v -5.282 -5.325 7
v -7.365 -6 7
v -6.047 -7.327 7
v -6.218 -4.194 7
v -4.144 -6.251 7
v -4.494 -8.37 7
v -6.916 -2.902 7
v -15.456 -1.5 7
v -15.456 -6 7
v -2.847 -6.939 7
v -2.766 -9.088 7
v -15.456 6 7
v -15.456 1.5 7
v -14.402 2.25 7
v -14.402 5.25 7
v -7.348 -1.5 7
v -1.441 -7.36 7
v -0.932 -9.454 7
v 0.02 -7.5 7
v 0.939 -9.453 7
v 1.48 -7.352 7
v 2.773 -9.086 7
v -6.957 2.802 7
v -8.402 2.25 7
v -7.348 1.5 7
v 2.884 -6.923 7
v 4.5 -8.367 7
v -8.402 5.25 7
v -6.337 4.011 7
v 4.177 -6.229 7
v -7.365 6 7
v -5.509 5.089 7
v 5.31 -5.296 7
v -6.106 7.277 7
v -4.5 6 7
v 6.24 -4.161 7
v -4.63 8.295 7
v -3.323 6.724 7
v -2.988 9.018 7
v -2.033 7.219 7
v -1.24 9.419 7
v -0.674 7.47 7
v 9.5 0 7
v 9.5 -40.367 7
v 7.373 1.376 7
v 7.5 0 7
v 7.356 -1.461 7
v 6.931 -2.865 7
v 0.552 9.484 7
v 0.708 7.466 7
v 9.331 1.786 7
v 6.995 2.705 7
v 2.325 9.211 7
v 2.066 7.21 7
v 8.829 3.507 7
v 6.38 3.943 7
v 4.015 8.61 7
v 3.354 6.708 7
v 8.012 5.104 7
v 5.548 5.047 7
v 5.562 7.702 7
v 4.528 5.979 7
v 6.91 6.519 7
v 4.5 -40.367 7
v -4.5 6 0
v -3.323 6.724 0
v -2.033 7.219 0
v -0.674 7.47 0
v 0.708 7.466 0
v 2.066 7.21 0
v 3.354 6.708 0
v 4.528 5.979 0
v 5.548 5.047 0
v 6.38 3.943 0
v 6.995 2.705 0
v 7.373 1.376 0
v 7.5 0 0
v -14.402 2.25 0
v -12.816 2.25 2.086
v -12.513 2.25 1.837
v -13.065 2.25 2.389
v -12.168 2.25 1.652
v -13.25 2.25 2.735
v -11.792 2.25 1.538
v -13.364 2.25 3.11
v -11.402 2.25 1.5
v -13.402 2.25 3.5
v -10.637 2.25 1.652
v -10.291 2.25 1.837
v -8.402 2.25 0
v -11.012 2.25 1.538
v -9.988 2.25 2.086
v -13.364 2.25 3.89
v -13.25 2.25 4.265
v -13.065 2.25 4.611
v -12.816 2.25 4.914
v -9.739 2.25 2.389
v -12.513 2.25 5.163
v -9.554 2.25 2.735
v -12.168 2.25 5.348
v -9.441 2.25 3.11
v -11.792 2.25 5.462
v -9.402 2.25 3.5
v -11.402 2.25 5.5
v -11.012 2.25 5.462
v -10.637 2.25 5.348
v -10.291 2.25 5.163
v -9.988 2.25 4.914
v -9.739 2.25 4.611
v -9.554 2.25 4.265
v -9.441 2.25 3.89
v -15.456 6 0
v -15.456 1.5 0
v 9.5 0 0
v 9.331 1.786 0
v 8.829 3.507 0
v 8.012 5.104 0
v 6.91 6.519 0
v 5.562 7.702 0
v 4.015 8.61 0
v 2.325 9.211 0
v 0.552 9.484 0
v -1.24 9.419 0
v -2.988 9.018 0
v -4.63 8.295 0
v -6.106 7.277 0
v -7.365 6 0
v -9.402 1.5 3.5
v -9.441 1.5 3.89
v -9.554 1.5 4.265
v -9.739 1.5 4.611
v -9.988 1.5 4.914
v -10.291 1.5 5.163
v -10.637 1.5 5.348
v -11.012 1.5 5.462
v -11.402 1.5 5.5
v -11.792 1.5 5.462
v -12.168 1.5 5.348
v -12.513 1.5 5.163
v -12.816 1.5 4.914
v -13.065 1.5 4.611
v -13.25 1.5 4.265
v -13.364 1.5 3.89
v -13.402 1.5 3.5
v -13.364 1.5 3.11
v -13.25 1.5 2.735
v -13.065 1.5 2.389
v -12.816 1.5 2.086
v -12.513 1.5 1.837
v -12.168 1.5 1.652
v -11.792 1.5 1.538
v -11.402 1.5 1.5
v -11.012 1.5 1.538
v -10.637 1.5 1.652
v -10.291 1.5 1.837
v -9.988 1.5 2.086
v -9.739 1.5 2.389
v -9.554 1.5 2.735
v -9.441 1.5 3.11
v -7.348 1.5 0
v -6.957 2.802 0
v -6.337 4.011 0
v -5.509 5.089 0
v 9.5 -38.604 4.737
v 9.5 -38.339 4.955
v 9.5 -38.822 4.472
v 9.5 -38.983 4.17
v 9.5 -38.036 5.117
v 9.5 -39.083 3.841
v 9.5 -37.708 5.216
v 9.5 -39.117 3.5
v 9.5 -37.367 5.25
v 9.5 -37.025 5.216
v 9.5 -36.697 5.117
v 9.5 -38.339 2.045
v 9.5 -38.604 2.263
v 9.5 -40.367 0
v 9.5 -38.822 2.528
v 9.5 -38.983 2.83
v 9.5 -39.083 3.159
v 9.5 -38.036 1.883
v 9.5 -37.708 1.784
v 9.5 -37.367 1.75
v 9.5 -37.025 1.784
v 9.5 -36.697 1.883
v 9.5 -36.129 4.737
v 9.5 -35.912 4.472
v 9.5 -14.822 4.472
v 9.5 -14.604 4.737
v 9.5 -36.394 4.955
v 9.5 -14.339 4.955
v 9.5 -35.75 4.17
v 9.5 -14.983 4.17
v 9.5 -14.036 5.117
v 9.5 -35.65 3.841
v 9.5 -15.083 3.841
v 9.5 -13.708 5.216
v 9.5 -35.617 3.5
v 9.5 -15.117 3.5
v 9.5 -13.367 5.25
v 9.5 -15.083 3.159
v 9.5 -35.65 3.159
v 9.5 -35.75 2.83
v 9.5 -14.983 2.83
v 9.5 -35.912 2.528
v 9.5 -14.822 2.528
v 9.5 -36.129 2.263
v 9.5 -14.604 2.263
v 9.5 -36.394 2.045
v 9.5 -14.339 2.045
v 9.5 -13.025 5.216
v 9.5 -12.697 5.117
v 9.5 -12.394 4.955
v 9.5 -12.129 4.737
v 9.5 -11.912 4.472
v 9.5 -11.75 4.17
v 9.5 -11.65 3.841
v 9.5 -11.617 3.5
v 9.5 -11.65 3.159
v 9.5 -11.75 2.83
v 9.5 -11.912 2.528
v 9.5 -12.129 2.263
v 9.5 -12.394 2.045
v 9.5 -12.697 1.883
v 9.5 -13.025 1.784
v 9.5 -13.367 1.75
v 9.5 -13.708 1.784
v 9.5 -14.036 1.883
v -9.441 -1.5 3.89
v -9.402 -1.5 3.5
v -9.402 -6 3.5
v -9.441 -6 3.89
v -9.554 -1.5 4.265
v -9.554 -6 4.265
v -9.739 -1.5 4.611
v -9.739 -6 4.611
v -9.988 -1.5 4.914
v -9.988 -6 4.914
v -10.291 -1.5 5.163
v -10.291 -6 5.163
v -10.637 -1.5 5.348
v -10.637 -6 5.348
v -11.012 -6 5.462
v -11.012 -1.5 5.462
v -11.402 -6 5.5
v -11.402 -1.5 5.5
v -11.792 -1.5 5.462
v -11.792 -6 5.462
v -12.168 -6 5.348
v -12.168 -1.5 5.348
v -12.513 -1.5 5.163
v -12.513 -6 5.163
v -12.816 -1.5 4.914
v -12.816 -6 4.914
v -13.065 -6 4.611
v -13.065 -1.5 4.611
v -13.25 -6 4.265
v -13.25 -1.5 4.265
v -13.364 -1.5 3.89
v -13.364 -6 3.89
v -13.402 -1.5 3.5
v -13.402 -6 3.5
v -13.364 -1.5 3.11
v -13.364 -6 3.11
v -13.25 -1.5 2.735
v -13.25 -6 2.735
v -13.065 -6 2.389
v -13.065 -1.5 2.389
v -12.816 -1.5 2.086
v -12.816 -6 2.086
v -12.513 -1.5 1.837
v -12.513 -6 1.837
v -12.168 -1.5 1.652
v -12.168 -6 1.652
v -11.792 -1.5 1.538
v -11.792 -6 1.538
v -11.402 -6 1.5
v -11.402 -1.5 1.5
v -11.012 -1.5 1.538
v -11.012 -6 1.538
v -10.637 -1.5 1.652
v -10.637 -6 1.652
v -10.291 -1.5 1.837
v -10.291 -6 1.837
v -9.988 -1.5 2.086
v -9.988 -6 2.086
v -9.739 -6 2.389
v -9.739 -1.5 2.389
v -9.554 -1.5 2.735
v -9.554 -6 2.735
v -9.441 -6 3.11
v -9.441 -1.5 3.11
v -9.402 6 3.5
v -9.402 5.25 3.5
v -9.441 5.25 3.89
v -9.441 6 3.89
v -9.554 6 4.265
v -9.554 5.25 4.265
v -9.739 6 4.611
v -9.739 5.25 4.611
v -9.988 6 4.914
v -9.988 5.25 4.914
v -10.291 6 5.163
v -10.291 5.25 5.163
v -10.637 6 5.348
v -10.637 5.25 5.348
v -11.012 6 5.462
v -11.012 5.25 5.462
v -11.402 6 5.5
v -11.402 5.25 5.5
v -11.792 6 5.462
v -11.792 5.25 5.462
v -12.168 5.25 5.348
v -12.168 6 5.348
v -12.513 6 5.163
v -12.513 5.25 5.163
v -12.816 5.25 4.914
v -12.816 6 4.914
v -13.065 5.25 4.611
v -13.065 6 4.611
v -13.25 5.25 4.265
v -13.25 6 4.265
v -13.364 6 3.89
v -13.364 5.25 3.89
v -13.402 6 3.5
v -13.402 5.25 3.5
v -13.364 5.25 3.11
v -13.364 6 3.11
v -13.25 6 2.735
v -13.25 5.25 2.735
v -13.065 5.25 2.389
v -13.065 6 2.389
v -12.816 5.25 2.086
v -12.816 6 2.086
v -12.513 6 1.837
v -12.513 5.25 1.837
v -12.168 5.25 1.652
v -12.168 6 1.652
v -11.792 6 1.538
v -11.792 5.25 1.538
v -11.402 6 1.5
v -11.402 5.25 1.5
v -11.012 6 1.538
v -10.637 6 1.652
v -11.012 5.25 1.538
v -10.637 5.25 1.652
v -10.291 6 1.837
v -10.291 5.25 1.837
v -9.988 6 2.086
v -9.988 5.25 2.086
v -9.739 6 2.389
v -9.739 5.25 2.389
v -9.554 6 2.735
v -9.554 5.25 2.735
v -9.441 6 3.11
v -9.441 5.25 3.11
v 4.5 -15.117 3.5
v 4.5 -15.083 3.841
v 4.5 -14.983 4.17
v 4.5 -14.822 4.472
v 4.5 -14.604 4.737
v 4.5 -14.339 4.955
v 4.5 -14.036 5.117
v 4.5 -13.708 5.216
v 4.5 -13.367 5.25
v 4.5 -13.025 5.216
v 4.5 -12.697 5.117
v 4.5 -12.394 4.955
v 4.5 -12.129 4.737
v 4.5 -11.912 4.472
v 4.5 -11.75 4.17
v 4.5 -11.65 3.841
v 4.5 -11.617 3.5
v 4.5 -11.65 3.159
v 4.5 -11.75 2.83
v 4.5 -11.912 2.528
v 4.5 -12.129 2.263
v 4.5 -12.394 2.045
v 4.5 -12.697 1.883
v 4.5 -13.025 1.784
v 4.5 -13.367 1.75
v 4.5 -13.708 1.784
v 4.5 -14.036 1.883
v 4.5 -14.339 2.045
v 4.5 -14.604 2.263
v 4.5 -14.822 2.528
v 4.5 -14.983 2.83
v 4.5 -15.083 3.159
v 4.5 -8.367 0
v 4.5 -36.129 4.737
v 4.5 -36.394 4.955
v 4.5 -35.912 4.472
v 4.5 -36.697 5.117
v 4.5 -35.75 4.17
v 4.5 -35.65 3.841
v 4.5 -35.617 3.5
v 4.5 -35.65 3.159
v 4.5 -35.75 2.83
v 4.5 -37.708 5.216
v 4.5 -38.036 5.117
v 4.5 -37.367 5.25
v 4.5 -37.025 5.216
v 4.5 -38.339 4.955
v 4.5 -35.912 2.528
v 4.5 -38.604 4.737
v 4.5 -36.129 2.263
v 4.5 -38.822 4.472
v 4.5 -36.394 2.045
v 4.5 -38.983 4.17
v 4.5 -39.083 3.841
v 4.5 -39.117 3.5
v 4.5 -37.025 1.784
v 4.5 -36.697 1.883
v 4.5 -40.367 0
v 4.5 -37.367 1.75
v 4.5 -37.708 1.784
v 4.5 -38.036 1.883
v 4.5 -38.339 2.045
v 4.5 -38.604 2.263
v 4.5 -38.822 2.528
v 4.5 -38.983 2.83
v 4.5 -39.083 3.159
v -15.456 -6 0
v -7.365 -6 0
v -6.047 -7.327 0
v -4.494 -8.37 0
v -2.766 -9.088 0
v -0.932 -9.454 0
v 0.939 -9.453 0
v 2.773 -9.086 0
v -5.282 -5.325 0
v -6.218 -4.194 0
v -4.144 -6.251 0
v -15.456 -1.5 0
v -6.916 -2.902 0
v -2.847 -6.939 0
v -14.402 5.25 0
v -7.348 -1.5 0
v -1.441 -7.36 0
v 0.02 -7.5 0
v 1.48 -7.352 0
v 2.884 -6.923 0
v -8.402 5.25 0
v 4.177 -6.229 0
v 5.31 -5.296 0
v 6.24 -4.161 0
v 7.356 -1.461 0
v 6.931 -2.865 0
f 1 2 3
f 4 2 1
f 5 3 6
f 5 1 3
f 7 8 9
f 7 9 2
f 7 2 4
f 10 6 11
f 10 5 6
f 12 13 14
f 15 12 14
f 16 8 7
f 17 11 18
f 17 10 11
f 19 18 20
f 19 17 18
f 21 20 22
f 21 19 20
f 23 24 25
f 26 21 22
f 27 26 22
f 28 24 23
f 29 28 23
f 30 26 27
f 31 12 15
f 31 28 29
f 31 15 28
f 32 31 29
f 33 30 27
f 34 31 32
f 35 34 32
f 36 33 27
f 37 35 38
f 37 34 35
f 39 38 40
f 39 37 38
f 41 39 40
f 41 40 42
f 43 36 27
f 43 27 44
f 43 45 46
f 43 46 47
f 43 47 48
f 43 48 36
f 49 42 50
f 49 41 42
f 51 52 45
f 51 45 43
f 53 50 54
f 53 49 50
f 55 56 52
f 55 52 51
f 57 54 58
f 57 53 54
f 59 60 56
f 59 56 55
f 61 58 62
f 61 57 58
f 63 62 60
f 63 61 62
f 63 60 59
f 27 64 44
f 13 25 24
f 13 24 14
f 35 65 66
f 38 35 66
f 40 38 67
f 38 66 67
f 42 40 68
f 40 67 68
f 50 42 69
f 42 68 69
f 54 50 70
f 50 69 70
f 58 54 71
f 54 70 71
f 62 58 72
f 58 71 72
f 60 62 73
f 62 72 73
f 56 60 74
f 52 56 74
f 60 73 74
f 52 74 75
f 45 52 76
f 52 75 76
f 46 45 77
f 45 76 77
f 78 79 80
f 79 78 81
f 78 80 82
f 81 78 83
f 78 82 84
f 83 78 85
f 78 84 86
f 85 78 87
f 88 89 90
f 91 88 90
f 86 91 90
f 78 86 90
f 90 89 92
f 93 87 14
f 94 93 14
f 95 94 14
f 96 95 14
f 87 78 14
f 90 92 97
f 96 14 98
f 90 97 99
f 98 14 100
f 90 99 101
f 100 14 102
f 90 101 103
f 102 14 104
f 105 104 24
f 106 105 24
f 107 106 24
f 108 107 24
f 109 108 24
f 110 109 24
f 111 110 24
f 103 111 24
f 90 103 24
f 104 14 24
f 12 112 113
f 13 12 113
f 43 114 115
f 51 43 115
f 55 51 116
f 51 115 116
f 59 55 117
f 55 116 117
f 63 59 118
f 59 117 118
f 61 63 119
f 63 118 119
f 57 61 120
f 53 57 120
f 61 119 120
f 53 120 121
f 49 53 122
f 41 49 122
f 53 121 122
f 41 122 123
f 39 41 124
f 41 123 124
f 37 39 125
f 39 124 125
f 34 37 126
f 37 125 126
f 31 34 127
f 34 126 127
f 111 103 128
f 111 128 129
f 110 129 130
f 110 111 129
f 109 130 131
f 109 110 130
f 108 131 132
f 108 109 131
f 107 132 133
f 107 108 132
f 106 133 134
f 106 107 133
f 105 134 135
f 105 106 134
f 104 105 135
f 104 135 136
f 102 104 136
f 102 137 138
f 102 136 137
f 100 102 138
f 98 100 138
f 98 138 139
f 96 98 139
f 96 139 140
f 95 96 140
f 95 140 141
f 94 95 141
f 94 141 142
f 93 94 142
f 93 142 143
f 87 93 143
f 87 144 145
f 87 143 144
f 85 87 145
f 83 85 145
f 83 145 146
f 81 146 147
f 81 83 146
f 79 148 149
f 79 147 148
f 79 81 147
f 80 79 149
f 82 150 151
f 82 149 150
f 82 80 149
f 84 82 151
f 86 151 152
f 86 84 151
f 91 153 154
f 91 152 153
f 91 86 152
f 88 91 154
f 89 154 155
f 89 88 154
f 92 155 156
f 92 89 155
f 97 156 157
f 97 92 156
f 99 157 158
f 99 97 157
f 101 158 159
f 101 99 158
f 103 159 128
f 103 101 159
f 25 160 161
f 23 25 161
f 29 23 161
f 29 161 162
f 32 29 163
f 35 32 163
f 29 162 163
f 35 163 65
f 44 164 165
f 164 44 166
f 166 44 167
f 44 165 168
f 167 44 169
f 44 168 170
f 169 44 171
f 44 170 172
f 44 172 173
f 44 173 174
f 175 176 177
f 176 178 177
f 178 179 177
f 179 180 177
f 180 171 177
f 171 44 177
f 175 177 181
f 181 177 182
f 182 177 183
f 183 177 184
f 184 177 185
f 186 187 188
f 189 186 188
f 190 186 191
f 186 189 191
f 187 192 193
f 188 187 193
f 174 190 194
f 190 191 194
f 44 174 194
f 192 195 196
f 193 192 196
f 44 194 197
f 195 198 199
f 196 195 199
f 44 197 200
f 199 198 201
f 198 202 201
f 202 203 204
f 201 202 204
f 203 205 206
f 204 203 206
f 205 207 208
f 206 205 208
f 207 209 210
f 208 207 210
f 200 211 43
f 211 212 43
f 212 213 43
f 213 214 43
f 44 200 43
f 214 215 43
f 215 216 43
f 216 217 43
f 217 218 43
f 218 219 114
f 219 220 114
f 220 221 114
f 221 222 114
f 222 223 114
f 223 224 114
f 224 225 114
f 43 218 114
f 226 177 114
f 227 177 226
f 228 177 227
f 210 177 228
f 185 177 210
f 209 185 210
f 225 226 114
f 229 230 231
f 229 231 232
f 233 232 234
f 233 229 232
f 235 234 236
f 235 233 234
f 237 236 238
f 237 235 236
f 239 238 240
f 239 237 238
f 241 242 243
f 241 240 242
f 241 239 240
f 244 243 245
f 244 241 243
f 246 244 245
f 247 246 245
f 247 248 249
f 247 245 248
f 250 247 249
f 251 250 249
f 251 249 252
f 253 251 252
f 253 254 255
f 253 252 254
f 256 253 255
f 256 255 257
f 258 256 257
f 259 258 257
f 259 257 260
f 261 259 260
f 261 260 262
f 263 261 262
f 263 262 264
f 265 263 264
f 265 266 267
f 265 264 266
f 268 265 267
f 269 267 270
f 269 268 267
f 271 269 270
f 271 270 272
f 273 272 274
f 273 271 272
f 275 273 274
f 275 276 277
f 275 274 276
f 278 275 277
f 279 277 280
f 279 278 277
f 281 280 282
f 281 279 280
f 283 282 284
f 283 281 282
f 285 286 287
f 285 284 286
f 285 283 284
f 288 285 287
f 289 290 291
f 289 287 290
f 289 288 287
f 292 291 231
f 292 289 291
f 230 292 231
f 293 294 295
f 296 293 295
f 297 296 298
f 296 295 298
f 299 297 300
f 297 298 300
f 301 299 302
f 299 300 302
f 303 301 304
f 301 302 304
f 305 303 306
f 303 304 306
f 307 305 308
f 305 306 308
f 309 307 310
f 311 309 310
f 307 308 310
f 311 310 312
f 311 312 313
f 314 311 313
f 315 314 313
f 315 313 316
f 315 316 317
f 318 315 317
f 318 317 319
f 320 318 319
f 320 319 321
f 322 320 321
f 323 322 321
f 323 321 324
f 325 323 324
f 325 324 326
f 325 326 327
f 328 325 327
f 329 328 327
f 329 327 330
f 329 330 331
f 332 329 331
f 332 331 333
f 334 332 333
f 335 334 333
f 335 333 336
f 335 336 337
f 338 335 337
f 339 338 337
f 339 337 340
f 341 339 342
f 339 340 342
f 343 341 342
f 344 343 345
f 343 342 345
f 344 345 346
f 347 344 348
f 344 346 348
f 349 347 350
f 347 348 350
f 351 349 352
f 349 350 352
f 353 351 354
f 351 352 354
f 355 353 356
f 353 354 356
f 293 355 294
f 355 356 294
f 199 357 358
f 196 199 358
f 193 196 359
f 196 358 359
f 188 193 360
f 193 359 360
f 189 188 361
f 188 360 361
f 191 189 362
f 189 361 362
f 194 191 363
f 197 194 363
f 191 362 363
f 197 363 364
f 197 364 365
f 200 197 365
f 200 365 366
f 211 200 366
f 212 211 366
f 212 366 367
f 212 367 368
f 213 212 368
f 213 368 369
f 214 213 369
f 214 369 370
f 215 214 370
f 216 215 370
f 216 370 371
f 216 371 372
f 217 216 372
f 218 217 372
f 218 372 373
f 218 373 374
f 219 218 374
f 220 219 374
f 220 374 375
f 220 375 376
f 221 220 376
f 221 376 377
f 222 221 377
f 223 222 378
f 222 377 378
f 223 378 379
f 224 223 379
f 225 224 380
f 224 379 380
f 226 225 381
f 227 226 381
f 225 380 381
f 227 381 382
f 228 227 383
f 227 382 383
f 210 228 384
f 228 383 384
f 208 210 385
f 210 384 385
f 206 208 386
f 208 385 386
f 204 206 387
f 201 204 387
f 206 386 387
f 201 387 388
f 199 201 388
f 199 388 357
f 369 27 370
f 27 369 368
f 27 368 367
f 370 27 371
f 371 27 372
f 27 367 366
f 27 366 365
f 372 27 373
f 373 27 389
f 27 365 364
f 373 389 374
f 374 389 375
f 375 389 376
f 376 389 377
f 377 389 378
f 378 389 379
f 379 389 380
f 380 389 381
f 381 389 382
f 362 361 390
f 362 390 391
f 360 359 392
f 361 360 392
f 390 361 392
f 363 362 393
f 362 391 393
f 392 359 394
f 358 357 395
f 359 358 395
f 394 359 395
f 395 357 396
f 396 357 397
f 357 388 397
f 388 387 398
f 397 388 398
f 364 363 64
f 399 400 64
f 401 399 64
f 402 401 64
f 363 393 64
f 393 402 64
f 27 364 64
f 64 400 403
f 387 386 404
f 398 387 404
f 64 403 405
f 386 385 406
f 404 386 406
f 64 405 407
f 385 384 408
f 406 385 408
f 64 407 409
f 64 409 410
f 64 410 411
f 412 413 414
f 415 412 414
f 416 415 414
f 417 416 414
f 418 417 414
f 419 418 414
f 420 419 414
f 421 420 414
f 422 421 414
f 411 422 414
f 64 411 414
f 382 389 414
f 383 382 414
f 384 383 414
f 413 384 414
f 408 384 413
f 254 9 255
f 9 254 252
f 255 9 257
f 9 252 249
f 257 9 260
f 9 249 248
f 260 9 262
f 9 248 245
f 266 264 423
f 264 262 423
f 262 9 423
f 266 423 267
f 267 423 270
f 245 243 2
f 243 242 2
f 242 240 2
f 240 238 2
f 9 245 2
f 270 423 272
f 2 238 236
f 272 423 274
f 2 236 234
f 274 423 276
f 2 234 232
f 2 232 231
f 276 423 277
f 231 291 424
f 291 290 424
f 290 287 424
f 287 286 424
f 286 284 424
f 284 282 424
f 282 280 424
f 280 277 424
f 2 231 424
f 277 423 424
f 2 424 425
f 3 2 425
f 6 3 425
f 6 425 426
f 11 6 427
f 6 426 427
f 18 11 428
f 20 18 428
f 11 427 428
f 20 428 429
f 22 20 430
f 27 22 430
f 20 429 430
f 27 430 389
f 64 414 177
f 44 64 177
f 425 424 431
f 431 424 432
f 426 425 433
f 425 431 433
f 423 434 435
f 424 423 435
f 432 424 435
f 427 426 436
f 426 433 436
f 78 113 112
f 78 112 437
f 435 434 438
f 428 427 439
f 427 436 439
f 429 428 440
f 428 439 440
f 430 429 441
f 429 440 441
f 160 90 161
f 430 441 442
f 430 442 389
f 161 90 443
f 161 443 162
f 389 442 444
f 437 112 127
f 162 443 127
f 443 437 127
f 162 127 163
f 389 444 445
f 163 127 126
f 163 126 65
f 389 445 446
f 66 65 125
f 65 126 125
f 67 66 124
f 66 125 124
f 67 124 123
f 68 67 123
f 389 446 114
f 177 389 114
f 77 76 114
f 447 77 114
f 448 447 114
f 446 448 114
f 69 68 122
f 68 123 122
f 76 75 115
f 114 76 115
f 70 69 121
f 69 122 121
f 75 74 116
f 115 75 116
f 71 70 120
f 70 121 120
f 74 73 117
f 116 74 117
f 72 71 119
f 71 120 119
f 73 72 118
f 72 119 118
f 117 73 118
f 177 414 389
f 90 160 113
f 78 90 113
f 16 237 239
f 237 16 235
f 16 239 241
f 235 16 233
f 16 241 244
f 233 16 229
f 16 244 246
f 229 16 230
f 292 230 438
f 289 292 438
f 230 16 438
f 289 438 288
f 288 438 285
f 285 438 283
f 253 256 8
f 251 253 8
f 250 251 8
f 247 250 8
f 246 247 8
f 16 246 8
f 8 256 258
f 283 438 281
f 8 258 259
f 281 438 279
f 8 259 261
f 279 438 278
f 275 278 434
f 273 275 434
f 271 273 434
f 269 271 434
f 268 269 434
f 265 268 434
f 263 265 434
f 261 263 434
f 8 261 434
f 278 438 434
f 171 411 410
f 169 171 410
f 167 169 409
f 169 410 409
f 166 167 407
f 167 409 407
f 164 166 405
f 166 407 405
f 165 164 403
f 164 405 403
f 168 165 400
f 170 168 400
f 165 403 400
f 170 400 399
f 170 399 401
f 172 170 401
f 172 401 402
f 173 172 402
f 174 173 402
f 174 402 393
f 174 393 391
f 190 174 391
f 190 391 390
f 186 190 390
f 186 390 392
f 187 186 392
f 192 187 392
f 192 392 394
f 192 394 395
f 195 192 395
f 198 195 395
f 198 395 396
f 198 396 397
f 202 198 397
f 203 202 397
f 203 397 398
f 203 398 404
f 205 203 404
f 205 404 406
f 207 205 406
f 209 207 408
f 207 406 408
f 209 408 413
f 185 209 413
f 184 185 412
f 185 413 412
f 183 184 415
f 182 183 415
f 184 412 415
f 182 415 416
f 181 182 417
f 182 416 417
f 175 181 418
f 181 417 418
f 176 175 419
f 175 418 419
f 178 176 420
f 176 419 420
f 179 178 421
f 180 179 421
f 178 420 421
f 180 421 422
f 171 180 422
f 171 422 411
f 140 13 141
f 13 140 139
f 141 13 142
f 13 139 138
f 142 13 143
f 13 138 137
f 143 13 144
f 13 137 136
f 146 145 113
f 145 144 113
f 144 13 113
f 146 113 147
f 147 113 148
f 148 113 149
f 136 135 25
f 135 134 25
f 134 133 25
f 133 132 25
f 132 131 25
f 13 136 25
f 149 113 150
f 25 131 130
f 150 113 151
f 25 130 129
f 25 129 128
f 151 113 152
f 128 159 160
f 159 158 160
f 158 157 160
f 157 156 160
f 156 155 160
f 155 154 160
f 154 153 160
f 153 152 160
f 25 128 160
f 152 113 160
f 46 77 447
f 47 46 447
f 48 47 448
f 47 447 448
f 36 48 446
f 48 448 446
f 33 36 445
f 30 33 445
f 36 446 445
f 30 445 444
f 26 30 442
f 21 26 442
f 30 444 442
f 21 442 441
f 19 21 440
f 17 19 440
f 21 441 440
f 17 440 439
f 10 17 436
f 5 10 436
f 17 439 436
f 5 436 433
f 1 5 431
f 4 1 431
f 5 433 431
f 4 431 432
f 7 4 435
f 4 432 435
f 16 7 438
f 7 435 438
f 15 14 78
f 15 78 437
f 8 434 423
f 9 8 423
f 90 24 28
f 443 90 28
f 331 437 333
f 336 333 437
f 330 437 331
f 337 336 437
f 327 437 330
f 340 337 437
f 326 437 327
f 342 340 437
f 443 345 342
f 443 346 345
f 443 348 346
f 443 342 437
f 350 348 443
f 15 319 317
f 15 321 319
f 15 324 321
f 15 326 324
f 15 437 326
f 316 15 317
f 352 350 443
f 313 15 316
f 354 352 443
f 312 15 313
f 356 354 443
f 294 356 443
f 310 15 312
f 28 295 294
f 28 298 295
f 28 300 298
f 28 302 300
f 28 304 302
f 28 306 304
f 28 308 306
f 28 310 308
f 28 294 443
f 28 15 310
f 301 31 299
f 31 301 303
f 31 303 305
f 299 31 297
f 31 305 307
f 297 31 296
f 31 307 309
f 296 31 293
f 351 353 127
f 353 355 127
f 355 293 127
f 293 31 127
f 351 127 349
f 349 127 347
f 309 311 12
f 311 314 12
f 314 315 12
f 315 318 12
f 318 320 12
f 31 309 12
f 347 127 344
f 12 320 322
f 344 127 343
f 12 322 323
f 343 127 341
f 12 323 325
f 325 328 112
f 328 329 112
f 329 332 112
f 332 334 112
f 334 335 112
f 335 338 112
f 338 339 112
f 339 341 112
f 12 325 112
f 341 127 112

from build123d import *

# Parameters (mm, degrees)
F1_DEPTH      = 7
F2_W          = 6
F2_H          = 3
F3_DEPTH      = 7.001
F4_R          = 1.75
F5_DEPTH      = 5.001
F6_R          = 2
F7_DEPTH      = 4.251
F7_DEPTH_BACK = 45.6176002653


# Not quite as in the source:
# - a feature names something its author has since deleted; it is built from what else it names


with BuildPart() as f1:
    # F0 (on Top) → F1 (new body)
    with BuildSketch(Plane.XY):
        with BuildLine():
            ThreePointArc((-7.3654599313, -6), (-8.6701827743, -3.8830311175), (-9.3808315196, -1.5))
            Line((-9.3808315196, -1.5), (-15.4559988071, -1.5))
            Line((-15.4559988071, -1.5), (-15.4559988071, -6))
            Line((-15.4559988071, -6), (-7.3654599313, -6))
        make_face()
        with BuildLine():
            ThreePointArc((-4.5, 6), (3.3541019662, 6.7082039325), (7.5, 0))
            ThreePointArc((7.5, 0), (0.753817215, -7.4620211475), (-7.3484692283, -1.5))
            Line((-7.3484692283, -1.5), (-9.3808315196, -1.5))
            ThreePointArc((-9.3808315196, -1.5), (-8.6701827743, -3.8830311175), (-7.3654599313, -6))
            ThreePointArc((-7.3654599313, -6), (-1.8582019154, -9.3164953519), (4.5, -8.3666002653))
            ThreePointArc((4.5, -8.3666002653), (8.1547532152, -4.8733971724), (9.5, 0))
            ThreePointArc((9.5, 0), (3.1841899011, 8.9504711984), (-7.3654599313, 6))
            Line((-7.3654599313, 6), (-4.5, 6))
        make_face()
        with BuildLine():
            ThreePointArc((-7.3484692283, 1.5), (-6.3371173071, 4.0113519213), (-4.5, 6))
            Line((-4.5, 6), (-7.3654599313, 6))
            ThreePointArc((-7.3654599313, 6), (-8.6701827743, 3.8830311175), (-9.3808315196, 1.5))
            Line((-9.3808315196, 1.5), (-7.3484692283, 1.5))
        make_face()
        with BuildLine():
            ThreePointArc((-9.3808315196, 1.5), (-8.6701827743, 3.8830311175), (-7.3654599313, 6))
            Line((-7.3654599313, 6), (-15.4559988071, 6))
            Line((-15.4559988071, 6), (-15.4559988071, 1.5))
            Line((-15.4559988071, 1.5), (-9.3808315196, 1.5))
        make_face()
        with BuildLine():
            Line((9.5, -40.3666002653), (9.5, 0))
            ThreePointArc((9.5, 0), (8.1547532152, -4.8733971724), (4.5, -8.3666002653))
            Line((4.5, -8.3666002653), (4.5, -40.3666002653))
            Line((4.5, -40.3666002653), (9.5, -40.3666002653))
        make_face()
    extrude(amount=F1_DEPTH)

    # F2 (on face) → F3 (cut, through all)
    with BuildSketch(Plane.XY.offset(7)):
        with Locations((-11.4022340177, 3.75)):
            Rectangle(F2_W, F2_H)
    extrude(amount=-F3_DEPTH, mode=Mode.SUBTRACT)

    # F4 (on face) → F5 (cut, through all)
    with BuildSketch(Plane(origin=(4.5, 0, 0), x_dir=(0, -1, 0), z_dir=(-1, 0, 0))):
        with Locations((13.3666002653, 3.5)):
            Circle(F4_R)
        with Locations((37.3666002653, 3.5)):
            Circle(F4_R)
    extrude(amount=-F5_DEPTH, mode=Mode.SUBTRACT)

    # F6 (on face) → F7 (cut, two sides)
    with BuildSketch(Plane.XZ.offset(-5.25)) as f7_sk:
        with Locations((-11.4022340177, 3.5)):
            Circle(F6_R)
    extrude(amount=-F7_DEPTH, mode=Mode.SUBTRACT)
    extrude(f7_sk.sketch, amount=F7_DEPTH_BACK, mode=Mode.SUBTRACT)


solid = f1.part
